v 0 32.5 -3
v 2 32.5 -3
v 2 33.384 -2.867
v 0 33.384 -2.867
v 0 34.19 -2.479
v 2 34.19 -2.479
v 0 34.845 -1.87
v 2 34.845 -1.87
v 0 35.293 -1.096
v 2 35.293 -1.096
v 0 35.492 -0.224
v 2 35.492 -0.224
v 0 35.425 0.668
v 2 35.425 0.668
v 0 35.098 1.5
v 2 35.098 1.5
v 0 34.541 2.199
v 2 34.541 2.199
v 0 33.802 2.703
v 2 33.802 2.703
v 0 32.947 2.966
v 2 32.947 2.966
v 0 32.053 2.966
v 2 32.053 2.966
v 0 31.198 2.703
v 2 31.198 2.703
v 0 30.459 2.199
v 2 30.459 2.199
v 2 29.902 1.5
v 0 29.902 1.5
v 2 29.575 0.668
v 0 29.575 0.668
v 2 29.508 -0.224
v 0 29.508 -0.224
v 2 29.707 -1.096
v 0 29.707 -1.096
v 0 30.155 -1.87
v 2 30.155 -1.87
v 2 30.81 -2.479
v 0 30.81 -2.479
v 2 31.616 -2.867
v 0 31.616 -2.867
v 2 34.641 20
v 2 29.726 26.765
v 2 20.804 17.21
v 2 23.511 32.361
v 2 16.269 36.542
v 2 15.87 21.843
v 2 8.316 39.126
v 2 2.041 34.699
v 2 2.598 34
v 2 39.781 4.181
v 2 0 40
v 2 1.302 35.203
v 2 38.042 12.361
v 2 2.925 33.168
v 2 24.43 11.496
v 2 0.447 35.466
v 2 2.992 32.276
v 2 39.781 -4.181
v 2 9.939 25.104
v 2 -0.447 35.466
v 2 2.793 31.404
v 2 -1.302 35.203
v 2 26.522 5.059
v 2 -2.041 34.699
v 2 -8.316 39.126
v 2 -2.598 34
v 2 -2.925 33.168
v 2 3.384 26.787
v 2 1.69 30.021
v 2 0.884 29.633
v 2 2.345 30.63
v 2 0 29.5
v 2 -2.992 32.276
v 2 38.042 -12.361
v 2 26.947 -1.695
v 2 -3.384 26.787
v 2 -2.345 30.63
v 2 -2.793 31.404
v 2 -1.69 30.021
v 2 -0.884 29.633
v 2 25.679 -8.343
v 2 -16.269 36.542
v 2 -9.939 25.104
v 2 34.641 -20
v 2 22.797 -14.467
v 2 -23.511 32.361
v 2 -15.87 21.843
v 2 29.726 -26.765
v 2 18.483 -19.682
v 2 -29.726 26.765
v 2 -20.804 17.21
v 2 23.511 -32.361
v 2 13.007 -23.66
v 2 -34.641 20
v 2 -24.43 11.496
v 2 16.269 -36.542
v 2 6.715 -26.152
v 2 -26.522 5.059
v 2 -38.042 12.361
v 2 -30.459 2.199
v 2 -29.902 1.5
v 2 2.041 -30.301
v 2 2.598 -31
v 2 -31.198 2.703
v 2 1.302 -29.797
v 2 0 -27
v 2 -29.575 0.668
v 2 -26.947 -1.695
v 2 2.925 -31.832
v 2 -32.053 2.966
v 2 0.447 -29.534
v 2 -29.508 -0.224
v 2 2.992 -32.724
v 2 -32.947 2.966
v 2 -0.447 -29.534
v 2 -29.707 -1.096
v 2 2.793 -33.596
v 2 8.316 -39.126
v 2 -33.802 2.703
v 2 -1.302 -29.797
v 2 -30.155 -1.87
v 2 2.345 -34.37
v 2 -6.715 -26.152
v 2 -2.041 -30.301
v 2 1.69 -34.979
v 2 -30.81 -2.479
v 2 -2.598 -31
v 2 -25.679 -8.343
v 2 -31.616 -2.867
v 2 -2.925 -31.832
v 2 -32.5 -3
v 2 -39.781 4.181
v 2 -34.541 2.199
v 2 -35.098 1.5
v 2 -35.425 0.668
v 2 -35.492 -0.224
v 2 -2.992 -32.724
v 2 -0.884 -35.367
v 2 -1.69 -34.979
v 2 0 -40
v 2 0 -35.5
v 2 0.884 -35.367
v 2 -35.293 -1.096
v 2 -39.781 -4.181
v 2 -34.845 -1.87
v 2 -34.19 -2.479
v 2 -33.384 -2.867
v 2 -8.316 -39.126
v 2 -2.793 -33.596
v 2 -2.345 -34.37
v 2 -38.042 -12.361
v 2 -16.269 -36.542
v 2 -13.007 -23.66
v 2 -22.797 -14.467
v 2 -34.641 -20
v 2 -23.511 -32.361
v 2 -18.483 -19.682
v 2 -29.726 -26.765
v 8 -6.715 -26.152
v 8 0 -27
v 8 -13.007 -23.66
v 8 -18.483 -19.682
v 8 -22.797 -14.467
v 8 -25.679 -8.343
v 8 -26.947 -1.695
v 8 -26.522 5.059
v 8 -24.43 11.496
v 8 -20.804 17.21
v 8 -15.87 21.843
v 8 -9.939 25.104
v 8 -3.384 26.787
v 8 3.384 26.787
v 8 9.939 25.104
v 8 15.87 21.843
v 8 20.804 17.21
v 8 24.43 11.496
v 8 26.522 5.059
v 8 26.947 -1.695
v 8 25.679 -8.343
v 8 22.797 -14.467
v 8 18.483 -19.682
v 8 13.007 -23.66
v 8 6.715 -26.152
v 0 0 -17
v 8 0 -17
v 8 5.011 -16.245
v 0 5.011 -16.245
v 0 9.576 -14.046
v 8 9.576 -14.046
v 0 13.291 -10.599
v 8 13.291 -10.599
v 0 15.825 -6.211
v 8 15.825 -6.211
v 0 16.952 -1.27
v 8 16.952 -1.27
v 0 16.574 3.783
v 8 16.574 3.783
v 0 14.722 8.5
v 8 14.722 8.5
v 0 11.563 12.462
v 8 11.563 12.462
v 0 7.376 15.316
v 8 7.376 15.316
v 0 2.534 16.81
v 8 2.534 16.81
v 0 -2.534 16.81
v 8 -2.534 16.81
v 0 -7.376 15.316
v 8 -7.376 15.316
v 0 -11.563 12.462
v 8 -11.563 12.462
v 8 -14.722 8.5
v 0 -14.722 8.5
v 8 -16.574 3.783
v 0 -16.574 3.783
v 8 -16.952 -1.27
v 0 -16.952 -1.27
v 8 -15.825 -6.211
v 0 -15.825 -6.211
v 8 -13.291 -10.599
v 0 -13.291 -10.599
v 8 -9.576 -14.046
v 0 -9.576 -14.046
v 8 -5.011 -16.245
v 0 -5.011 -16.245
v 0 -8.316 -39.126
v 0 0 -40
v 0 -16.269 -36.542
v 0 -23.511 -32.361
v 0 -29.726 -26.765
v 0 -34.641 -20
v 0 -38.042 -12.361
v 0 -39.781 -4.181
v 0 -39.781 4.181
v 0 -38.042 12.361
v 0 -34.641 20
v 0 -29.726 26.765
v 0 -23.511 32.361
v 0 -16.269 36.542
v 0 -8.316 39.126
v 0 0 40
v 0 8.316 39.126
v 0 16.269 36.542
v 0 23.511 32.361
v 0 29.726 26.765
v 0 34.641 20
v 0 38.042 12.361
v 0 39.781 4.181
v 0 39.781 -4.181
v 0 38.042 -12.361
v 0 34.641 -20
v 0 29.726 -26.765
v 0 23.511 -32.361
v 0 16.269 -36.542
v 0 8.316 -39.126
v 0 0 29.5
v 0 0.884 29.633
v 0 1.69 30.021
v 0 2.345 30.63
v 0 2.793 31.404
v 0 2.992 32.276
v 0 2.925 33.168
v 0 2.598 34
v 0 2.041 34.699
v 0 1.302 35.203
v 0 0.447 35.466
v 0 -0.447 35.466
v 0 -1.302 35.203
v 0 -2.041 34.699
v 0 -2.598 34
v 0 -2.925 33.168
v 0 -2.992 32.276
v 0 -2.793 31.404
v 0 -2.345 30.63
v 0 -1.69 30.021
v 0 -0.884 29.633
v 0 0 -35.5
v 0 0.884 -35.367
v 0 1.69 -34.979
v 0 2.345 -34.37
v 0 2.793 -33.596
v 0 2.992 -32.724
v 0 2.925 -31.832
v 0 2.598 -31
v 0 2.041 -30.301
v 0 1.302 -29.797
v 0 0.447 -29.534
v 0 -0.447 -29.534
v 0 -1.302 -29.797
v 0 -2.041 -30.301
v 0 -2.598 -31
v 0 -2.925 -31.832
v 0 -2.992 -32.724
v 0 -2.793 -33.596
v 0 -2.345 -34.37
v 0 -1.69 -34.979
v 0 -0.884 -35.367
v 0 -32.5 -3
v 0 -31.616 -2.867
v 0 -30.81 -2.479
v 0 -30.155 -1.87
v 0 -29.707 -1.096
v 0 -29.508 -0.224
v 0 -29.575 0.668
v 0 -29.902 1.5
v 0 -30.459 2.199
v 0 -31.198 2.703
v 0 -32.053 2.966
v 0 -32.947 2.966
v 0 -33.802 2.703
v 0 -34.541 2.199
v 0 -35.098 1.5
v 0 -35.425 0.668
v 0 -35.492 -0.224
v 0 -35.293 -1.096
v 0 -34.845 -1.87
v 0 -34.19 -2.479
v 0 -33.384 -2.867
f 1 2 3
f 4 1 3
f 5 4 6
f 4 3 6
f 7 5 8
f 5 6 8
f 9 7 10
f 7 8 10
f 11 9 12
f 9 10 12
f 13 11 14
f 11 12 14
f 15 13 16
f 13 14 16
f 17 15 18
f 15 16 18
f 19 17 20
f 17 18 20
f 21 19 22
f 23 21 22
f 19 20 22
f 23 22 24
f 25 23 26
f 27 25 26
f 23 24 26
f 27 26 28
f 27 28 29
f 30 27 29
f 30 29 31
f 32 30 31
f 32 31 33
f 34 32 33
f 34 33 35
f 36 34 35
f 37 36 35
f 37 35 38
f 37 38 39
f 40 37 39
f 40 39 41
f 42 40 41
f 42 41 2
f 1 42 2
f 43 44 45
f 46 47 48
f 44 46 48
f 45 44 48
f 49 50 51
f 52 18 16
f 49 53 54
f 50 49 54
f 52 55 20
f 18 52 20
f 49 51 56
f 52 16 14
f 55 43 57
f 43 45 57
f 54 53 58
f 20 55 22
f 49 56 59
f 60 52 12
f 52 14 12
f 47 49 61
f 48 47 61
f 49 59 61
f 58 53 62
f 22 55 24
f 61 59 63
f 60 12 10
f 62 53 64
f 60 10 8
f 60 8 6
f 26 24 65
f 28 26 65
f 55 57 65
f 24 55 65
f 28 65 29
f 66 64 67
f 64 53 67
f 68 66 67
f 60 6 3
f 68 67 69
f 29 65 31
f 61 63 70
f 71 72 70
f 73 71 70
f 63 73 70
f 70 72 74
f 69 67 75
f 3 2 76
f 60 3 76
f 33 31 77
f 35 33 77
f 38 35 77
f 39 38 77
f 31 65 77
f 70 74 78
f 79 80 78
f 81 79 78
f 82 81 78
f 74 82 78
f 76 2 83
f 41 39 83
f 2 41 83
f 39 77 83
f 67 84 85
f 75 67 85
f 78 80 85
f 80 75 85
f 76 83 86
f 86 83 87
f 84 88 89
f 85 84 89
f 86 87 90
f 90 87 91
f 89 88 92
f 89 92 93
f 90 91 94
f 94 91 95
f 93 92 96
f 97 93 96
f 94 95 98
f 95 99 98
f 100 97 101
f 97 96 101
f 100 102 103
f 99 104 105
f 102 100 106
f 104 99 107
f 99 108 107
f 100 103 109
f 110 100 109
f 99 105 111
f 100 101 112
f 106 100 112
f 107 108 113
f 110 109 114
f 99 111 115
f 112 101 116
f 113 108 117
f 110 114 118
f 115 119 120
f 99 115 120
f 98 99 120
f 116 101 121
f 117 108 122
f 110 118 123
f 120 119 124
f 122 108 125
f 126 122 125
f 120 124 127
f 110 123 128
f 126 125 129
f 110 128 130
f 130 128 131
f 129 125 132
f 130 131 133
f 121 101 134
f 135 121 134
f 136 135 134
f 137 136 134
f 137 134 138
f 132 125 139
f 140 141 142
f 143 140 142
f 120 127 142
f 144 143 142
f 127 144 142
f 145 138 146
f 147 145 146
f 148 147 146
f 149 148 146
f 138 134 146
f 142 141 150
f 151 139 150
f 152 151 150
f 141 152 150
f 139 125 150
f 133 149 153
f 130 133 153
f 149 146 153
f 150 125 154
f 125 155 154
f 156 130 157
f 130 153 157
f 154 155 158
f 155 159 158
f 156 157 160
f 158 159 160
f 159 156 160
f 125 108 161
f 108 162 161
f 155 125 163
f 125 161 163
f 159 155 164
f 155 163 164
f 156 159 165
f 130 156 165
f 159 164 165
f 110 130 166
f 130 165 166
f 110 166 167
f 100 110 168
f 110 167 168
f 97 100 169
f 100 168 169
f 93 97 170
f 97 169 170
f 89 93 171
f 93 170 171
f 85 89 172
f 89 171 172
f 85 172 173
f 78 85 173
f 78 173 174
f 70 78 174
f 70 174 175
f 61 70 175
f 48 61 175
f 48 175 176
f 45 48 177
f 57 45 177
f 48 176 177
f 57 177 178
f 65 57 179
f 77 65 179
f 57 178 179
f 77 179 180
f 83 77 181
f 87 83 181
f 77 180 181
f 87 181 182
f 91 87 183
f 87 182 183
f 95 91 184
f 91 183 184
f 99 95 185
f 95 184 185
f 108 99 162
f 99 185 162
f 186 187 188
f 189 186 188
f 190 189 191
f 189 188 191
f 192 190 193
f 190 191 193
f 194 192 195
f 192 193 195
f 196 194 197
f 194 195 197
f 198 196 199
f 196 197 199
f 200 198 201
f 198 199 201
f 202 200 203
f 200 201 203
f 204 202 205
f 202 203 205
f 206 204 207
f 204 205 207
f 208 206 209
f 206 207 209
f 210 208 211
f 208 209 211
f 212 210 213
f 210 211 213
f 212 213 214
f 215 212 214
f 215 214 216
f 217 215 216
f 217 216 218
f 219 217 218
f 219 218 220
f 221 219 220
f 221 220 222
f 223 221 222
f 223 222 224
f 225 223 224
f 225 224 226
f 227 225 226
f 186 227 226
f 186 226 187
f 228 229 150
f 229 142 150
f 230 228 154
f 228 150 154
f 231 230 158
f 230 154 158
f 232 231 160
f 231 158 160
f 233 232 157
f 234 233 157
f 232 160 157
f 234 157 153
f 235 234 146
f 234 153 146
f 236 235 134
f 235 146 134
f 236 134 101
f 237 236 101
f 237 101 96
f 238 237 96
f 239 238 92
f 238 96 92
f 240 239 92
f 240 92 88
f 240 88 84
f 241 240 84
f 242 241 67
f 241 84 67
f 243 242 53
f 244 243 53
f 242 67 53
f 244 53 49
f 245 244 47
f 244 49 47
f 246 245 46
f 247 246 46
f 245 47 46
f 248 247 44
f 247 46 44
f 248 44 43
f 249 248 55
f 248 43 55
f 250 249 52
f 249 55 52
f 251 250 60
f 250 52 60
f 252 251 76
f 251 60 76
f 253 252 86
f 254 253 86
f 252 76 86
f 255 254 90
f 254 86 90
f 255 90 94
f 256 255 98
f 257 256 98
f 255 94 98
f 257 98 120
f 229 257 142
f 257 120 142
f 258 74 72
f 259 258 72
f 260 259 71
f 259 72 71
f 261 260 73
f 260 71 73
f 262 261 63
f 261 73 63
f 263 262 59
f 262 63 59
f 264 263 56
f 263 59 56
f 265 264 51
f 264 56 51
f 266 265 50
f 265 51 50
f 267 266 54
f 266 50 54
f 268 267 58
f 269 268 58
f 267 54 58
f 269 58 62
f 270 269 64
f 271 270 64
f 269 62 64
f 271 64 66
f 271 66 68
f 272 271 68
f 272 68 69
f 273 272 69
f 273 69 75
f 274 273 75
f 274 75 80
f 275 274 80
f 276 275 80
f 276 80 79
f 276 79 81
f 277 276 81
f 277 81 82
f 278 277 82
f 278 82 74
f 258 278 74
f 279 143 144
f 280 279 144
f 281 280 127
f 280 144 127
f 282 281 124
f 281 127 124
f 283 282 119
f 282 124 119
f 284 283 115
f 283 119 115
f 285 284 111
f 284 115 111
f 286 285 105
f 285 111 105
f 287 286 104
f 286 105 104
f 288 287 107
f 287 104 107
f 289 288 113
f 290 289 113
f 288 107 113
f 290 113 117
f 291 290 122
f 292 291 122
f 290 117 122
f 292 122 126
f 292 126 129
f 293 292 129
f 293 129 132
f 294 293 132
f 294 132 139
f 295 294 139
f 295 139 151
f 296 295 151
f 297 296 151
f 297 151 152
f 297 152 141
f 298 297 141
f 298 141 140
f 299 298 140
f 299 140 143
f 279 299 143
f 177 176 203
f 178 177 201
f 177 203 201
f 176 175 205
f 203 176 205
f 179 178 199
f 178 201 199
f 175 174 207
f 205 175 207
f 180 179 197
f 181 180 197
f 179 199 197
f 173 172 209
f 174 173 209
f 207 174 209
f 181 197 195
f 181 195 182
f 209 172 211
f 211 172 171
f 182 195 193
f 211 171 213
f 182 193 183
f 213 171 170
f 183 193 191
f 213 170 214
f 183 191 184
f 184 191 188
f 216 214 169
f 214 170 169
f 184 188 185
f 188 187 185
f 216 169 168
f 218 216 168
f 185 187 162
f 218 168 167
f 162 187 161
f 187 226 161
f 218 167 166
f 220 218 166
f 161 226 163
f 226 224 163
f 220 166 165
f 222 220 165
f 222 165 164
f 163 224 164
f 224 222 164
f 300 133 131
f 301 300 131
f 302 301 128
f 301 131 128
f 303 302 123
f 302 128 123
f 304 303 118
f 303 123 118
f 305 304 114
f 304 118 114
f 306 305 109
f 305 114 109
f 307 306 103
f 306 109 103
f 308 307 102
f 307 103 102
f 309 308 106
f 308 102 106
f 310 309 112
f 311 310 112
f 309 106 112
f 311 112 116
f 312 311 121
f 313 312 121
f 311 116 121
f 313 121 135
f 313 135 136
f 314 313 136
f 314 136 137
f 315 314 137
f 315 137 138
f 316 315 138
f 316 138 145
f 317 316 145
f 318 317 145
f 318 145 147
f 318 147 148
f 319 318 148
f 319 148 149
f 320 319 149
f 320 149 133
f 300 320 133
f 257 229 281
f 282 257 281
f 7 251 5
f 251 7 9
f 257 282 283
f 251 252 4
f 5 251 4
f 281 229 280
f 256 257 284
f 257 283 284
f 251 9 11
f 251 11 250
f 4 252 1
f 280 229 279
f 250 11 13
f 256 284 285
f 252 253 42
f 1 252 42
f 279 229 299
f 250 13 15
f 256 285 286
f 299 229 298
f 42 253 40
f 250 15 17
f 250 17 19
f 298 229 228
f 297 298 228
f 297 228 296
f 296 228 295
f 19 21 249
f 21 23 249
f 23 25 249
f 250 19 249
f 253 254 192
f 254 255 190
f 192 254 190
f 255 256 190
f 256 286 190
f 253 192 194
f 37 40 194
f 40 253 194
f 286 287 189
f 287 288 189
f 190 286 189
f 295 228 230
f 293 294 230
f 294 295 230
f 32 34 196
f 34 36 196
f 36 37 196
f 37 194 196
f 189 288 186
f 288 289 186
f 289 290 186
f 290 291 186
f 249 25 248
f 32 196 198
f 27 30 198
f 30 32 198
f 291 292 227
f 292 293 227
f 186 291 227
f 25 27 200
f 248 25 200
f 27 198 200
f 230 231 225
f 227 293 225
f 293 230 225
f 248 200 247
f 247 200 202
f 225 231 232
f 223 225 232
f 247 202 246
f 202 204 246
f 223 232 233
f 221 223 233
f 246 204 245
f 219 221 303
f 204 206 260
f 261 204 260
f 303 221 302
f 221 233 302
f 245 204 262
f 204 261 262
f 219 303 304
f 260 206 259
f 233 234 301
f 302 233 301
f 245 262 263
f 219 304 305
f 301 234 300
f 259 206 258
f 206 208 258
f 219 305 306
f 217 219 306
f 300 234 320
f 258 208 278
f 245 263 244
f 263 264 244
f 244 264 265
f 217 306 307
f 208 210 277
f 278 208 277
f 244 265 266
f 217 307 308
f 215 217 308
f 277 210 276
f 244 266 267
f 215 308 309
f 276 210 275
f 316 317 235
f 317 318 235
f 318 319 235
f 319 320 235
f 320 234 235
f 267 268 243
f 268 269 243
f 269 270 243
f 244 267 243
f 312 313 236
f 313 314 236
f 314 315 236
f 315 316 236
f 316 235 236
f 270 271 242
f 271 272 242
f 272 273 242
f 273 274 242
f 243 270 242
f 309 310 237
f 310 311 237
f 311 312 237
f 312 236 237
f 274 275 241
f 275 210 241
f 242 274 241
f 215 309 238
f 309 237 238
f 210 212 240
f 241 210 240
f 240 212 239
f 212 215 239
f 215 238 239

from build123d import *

# Parameters (mm, degrees)
SKETCH3_R          = 17
CUT_EXTRUDE1_DEPTH = 10
SKETCH4_R          = 3
CUT_EXTRUDE2_DEPTH = 28


with BuildPart() as part:
    # Sketch2 → Revolve1 (revolve)
    with BuildSketch(Plane.XY, mode=Mode.PRIVATE) as revolve1_sk:
        Polygon((0, 0), (0, 40), (2, 40), (2, 27), (8, 27), (8, 0), align=None)
    revolve(revolve1_sk.sketch.rotate(Axis((8, 0, 0), (-1, 0, 0)), 90), axis=Axis((8, 0, 0), (-1, 0, 0)))

    # Sketch3 → Cut-Extrude1 (cut)
    with BuildSketch(Plane(origin=(8, 0, 0), x_dir=(0, 0, -1), z_dir=(1, 0, 0))):
        Circle(SKETCH3_R)
    extrude(amount=-CUT_EXTRUDE1_DEPTH, mode=Mode.SUBTRACT)

    # Sketch4 → Cut-Extrude2 (cut)
    with BuildSketch(Plane(origin=(8, 0, 0), x_dir=(0, 0, -1), z_dir=(1, 0, 0))):
        with Locations((0, -32.5)):
            Circle(SKETCH4_R)
        with Locations((32.5, 0)):
            Circle(SKETCH4_R)
        with Locations((0, 32.5)):
            Circle(SKETCH4_R)
        with Locations((-32.5, 0)):
            Circle(SKETCH4_R)
    extrude(amount=-CUT_EXTRUDE2_DEPTH, mode=Mode.SUBTRACT)


solid = part.part
